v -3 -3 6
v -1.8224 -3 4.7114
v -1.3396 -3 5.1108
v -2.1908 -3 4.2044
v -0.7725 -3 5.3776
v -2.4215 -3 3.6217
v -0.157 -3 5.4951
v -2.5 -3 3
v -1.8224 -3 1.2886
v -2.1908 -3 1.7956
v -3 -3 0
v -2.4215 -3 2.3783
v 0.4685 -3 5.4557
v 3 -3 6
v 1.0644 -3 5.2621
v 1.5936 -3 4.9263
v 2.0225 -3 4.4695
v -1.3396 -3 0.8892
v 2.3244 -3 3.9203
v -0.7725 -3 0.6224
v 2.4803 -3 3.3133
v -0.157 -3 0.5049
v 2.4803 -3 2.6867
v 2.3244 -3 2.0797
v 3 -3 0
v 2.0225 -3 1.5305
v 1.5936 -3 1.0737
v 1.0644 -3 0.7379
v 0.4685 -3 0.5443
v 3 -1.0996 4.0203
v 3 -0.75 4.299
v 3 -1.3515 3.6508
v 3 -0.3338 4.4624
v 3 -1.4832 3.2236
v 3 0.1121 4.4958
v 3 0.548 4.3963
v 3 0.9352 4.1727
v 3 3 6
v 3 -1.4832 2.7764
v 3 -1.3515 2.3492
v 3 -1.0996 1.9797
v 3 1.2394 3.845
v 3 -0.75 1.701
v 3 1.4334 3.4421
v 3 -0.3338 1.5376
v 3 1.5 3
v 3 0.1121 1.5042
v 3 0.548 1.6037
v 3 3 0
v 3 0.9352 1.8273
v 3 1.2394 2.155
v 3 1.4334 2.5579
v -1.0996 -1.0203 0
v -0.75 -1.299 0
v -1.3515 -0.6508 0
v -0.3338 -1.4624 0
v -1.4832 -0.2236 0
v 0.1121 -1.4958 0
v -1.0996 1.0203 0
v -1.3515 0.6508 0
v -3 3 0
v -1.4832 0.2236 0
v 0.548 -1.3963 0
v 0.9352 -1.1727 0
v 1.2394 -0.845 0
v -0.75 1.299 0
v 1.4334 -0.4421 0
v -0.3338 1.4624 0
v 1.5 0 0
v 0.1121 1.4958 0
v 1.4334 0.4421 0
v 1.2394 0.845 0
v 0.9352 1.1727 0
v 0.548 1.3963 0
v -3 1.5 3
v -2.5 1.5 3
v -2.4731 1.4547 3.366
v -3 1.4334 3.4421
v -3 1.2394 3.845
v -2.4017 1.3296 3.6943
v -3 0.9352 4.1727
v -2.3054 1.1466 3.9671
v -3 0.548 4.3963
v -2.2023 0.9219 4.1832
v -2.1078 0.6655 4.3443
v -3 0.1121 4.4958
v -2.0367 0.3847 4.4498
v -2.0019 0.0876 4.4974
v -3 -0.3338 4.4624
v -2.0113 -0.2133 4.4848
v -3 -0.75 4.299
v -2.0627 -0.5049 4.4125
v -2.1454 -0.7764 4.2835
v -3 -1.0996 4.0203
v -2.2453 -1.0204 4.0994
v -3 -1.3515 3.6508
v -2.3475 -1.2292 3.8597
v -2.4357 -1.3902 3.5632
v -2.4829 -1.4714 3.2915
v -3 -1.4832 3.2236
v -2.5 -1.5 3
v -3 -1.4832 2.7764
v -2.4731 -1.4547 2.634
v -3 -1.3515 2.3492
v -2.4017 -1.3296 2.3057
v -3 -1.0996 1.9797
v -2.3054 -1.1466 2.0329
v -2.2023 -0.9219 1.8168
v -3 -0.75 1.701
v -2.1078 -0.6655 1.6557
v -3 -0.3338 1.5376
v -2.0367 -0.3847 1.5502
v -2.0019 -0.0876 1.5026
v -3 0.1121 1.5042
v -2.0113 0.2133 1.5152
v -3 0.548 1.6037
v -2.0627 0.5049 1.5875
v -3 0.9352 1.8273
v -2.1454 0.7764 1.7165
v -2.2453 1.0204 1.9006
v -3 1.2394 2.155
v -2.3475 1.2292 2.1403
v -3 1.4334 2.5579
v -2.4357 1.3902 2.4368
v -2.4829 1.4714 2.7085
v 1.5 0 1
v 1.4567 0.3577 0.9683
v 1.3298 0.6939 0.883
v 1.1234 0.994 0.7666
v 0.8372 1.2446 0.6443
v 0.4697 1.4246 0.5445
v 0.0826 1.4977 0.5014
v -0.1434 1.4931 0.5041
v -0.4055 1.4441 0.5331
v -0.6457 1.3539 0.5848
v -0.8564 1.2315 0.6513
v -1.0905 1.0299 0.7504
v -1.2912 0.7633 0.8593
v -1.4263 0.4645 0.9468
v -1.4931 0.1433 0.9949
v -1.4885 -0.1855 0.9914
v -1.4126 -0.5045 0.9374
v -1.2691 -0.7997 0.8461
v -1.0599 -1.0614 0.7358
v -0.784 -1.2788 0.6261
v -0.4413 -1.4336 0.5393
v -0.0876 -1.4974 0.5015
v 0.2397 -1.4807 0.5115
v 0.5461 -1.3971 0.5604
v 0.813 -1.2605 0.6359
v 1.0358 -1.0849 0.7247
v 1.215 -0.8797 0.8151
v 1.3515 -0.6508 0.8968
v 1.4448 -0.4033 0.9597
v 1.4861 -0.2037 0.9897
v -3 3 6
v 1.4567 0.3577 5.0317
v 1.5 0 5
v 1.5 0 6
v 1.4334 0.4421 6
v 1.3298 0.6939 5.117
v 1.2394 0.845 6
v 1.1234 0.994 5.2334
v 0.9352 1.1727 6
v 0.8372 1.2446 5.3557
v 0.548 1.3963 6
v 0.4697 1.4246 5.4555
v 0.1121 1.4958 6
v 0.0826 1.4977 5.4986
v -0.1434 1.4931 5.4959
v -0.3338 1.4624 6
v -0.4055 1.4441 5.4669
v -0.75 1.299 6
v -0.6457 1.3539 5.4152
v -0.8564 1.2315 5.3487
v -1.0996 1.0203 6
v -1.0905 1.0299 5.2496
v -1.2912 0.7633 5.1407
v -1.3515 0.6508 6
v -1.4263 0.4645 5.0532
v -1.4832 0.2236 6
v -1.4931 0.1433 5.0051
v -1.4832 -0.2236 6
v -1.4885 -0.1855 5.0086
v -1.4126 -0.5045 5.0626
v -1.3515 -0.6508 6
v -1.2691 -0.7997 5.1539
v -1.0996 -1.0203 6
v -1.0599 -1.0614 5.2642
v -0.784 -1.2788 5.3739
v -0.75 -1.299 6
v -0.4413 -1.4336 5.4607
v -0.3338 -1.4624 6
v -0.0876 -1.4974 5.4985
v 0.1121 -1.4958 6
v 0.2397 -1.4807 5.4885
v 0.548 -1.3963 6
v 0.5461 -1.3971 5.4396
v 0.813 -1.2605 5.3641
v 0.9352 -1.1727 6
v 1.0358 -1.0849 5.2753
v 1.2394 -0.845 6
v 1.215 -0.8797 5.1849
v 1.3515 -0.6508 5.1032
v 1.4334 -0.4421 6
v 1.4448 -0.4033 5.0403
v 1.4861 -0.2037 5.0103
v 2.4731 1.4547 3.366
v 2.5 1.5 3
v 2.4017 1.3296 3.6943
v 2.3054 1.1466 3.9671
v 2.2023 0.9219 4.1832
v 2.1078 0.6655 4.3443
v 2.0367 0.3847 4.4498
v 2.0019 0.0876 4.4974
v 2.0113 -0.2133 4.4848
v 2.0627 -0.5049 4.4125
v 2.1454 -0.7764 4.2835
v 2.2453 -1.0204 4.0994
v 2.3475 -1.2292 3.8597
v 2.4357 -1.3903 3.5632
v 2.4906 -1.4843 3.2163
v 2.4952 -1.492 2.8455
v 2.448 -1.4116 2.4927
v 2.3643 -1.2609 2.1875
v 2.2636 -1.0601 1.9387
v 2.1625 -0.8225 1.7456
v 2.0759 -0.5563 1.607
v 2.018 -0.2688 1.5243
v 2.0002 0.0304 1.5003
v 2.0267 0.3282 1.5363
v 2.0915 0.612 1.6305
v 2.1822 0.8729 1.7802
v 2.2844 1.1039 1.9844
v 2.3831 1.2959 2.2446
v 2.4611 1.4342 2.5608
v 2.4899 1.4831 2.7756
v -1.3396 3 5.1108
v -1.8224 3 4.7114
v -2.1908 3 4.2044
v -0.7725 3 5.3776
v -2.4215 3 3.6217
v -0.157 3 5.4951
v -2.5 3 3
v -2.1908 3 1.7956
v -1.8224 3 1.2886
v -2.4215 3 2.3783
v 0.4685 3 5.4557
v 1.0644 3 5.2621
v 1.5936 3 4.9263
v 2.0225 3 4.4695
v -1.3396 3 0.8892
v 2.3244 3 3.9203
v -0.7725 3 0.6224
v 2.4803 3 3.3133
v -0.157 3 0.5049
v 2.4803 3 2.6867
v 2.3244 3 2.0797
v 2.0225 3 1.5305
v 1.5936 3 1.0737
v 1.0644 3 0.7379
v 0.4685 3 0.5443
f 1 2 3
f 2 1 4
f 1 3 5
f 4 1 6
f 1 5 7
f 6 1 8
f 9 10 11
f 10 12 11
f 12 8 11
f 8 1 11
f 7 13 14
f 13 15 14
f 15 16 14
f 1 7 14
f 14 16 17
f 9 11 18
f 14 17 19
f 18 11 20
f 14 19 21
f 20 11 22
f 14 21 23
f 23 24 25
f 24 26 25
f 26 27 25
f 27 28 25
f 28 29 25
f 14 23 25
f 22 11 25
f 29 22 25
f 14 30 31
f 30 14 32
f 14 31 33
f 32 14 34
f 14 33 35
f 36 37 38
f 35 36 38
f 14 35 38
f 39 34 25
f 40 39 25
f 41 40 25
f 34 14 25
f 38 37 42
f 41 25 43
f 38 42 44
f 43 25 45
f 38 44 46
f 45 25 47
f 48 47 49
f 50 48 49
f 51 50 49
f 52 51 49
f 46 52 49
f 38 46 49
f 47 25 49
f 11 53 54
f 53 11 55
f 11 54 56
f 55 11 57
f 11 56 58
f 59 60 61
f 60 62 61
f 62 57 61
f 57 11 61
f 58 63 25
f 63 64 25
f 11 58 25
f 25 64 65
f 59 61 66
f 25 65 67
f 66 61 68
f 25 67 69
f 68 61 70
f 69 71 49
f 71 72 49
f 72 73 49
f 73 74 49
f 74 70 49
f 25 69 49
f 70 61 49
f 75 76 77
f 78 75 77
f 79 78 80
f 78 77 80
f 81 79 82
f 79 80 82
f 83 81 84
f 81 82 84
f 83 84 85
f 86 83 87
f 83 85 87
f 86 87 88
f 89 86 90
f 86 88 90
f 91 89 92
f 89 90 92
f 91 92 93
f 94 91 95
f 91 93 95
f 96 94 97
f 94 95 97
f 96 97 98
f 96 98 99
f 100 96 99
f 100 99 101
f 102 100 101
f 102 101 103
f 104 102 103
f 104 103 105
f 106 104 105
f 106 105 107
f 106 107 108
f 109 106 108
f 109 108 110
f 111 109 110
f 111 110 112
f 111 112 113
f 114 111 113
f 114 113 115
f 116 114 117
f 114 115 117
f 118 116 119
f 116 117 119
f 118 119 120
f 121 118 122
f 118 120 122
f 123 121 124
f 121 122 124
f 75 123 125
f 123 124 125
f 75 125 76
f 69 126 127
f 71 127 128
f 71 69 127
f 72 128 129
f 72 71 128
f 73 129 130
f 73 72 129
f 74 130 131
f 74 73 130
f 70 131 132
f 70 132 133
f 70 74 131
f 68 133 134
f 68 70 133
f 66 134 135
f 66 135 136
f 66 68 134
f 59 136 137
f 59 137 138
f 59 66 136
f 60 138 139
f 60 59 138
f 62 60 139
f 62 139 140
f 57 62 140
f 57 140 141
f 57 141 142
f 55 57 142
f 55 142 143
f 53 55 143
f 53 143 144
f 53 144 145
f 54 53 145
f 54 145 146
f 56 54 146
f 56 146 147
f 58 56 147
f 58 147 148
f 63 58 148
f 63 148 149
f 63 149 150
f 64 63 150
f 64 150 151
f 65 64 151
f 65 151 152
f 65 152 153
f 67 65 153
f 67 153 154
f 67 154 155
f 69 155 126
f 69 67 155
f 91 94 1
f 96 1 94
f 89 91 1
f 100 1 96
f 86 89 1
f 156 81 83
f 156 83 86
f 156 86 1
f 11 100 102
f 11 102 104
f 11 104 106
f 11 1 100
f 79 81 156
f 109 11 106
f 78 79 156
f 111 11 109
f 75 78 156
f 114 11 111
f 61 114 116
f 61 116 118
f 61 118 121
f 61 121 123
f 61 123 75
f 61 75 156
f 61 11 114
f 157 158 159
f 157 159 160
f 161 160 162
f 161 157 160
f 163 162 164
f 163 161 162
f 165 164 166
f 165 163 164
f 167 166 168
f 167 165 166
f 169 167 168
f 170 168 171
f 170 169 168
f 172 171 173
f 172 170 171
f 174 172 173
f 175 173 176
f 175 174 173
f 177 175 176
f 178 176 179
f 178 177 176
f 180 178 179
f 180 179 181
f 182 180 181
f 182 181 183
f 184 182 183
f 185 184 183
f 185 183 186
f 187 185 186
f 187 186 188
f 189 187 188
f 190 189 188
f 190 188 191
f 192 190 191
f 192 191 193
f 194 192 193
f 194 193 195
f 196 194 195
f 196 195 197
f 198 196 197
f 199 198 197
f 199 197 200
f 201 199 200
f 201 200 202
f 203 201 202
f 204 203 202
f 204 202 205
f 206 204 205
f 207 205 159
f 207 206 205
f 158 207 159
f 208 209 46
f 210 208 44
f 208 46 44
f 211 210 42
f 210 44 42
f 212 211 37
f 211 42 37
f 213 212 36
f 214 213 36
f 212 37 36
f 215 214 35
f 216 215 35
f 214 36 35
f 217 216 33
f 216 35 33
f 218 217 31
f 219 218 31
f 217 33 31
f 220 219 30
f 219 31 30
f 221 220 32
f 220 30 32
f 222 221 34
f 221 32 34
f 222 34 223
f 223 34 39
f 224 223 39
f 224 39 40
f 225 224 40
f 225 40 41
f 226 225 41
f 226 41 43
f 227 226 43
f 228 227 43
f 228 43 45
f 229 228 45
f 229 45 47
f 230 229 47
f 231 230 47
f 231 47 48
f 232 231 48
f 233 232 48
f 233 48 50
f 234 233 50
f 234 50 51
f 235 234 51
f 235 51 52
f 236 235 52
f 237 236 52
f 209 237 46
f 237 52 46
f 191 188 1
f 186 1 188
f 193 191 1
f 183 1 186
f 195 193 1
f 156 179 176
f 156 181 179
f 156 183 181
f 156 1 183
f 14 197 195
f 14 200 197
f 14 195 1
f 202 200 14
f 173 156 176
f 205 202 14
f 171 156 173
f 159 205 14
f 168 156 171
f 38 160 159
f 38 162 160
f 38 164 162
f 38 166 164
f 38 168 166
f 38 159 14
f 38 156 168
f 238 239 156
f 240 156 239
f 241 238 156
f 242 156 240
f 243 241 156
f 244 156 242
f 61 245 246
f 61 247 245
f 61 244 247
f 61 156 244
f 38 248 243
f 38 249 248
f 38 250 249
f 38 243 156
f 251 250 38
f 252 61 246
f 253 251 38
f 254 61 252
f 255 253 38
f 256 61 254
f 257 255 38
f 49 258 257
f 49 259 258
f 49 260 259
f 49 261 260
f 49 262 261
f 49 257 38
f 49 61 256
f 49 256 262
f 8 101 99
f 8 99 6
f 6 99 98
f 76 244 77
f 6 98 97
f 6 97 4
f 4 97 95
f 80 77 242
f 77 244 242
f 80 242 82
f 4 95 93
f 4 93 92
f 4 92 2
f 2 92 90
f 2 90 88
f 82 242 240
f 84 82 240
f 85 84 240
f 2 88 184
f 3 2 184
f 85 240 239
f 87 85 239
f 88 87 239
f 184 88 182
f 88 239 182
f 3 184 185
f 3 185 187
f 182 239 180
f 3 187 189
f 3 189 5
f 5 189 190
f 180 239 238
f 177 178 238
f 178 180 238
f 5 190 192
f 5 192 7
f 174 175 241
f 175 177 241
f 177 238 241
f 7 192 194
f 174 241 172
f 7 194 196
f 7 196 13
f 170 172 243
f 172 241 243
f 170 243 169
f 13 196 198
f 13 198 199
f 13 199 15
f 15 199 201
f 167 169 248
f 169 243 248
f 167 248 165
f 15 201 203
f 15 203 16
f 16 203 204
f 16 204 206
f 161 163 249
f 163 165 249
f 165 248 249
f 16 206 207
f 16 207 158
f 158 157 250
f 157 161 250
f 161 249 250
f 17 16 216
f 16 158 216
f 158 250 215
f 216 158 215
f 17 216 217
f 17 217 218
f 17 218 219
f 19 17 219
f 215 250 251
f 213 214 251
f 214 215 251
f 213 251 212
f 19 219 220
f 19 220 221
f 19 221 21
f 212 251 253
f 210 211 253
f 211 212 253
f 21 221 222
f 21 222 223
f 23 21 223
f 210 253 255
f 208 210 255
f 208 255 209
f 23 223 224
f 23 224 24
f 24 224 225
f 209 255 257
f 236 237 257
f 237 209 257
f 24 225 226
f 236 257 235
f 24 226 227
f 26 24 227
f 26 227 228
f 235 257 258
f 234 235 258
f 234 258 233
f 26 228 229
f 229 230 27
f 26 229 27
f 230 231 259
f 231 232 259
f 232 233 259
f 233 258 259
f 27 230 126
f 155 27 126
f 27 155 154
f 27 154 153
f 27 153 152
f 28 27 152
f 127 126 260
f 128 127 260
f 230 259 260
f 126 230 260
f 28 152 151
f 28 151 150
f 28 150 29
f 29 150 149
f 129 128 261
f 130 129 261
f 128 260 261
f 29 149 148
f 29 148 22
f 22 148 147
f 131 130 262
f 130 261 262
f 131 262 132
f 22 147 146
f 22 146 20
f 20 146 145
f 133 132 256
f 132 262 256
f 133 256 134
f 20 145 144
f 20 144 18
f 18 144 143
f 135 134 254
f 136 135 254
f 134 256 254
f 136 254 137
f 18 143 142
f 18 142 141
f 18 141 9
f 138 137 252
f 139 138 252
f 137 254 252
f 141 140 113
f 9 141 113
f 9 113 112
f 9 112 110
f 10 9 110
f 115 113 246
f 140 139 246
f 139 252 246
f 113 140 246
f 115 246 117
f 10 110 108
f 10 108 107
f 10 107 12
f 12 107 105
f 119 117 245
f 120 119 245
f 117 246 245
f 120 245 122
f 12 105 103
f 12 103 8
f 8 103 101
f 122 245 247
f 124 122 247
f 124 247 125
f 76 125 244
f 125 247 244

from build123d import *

# Parameters (mm, degrees)
F0_W     = 6
F0_H     = 6
F0_R     = 1.5
F1_DEPTH = 6
F2_R     = 1.5
F3_DEPTH = 25
F4_R     = 2.5
F5_DEPTH = 25


with BuildPart() as f1:
    # F0 (on Top) → F1 (new body)
    with BuildSketch(Plane.XY):
        Rectangle(F0_W, F0_H)
        Circle(F0_R, mode=Mode.SUBTRACT)
    extrude(amount=F1_DEPTH)

    # F2 (on face) → F3 (cut)
    with BuildSketch(Plane.YZ.offset(3)):
        with Locations((0, 3)):
            Circle(F2_R)
    extrude(amount=-F3_DEPTH, mode=Mode.SUBTRACT)

    # F4 (on face) → F5 (cut)
    with BuildSketch(Plane(origin=(0, 3, 0), x_dir=(-1, 0, 0), z_dir=(0, 1, 0))):
        with Locations((0, 3)):
            Circle(F4_R)
    extrude(amount=-F5_DEPTH, mode=Mode.SUBTRACT)


solid = f1.part
